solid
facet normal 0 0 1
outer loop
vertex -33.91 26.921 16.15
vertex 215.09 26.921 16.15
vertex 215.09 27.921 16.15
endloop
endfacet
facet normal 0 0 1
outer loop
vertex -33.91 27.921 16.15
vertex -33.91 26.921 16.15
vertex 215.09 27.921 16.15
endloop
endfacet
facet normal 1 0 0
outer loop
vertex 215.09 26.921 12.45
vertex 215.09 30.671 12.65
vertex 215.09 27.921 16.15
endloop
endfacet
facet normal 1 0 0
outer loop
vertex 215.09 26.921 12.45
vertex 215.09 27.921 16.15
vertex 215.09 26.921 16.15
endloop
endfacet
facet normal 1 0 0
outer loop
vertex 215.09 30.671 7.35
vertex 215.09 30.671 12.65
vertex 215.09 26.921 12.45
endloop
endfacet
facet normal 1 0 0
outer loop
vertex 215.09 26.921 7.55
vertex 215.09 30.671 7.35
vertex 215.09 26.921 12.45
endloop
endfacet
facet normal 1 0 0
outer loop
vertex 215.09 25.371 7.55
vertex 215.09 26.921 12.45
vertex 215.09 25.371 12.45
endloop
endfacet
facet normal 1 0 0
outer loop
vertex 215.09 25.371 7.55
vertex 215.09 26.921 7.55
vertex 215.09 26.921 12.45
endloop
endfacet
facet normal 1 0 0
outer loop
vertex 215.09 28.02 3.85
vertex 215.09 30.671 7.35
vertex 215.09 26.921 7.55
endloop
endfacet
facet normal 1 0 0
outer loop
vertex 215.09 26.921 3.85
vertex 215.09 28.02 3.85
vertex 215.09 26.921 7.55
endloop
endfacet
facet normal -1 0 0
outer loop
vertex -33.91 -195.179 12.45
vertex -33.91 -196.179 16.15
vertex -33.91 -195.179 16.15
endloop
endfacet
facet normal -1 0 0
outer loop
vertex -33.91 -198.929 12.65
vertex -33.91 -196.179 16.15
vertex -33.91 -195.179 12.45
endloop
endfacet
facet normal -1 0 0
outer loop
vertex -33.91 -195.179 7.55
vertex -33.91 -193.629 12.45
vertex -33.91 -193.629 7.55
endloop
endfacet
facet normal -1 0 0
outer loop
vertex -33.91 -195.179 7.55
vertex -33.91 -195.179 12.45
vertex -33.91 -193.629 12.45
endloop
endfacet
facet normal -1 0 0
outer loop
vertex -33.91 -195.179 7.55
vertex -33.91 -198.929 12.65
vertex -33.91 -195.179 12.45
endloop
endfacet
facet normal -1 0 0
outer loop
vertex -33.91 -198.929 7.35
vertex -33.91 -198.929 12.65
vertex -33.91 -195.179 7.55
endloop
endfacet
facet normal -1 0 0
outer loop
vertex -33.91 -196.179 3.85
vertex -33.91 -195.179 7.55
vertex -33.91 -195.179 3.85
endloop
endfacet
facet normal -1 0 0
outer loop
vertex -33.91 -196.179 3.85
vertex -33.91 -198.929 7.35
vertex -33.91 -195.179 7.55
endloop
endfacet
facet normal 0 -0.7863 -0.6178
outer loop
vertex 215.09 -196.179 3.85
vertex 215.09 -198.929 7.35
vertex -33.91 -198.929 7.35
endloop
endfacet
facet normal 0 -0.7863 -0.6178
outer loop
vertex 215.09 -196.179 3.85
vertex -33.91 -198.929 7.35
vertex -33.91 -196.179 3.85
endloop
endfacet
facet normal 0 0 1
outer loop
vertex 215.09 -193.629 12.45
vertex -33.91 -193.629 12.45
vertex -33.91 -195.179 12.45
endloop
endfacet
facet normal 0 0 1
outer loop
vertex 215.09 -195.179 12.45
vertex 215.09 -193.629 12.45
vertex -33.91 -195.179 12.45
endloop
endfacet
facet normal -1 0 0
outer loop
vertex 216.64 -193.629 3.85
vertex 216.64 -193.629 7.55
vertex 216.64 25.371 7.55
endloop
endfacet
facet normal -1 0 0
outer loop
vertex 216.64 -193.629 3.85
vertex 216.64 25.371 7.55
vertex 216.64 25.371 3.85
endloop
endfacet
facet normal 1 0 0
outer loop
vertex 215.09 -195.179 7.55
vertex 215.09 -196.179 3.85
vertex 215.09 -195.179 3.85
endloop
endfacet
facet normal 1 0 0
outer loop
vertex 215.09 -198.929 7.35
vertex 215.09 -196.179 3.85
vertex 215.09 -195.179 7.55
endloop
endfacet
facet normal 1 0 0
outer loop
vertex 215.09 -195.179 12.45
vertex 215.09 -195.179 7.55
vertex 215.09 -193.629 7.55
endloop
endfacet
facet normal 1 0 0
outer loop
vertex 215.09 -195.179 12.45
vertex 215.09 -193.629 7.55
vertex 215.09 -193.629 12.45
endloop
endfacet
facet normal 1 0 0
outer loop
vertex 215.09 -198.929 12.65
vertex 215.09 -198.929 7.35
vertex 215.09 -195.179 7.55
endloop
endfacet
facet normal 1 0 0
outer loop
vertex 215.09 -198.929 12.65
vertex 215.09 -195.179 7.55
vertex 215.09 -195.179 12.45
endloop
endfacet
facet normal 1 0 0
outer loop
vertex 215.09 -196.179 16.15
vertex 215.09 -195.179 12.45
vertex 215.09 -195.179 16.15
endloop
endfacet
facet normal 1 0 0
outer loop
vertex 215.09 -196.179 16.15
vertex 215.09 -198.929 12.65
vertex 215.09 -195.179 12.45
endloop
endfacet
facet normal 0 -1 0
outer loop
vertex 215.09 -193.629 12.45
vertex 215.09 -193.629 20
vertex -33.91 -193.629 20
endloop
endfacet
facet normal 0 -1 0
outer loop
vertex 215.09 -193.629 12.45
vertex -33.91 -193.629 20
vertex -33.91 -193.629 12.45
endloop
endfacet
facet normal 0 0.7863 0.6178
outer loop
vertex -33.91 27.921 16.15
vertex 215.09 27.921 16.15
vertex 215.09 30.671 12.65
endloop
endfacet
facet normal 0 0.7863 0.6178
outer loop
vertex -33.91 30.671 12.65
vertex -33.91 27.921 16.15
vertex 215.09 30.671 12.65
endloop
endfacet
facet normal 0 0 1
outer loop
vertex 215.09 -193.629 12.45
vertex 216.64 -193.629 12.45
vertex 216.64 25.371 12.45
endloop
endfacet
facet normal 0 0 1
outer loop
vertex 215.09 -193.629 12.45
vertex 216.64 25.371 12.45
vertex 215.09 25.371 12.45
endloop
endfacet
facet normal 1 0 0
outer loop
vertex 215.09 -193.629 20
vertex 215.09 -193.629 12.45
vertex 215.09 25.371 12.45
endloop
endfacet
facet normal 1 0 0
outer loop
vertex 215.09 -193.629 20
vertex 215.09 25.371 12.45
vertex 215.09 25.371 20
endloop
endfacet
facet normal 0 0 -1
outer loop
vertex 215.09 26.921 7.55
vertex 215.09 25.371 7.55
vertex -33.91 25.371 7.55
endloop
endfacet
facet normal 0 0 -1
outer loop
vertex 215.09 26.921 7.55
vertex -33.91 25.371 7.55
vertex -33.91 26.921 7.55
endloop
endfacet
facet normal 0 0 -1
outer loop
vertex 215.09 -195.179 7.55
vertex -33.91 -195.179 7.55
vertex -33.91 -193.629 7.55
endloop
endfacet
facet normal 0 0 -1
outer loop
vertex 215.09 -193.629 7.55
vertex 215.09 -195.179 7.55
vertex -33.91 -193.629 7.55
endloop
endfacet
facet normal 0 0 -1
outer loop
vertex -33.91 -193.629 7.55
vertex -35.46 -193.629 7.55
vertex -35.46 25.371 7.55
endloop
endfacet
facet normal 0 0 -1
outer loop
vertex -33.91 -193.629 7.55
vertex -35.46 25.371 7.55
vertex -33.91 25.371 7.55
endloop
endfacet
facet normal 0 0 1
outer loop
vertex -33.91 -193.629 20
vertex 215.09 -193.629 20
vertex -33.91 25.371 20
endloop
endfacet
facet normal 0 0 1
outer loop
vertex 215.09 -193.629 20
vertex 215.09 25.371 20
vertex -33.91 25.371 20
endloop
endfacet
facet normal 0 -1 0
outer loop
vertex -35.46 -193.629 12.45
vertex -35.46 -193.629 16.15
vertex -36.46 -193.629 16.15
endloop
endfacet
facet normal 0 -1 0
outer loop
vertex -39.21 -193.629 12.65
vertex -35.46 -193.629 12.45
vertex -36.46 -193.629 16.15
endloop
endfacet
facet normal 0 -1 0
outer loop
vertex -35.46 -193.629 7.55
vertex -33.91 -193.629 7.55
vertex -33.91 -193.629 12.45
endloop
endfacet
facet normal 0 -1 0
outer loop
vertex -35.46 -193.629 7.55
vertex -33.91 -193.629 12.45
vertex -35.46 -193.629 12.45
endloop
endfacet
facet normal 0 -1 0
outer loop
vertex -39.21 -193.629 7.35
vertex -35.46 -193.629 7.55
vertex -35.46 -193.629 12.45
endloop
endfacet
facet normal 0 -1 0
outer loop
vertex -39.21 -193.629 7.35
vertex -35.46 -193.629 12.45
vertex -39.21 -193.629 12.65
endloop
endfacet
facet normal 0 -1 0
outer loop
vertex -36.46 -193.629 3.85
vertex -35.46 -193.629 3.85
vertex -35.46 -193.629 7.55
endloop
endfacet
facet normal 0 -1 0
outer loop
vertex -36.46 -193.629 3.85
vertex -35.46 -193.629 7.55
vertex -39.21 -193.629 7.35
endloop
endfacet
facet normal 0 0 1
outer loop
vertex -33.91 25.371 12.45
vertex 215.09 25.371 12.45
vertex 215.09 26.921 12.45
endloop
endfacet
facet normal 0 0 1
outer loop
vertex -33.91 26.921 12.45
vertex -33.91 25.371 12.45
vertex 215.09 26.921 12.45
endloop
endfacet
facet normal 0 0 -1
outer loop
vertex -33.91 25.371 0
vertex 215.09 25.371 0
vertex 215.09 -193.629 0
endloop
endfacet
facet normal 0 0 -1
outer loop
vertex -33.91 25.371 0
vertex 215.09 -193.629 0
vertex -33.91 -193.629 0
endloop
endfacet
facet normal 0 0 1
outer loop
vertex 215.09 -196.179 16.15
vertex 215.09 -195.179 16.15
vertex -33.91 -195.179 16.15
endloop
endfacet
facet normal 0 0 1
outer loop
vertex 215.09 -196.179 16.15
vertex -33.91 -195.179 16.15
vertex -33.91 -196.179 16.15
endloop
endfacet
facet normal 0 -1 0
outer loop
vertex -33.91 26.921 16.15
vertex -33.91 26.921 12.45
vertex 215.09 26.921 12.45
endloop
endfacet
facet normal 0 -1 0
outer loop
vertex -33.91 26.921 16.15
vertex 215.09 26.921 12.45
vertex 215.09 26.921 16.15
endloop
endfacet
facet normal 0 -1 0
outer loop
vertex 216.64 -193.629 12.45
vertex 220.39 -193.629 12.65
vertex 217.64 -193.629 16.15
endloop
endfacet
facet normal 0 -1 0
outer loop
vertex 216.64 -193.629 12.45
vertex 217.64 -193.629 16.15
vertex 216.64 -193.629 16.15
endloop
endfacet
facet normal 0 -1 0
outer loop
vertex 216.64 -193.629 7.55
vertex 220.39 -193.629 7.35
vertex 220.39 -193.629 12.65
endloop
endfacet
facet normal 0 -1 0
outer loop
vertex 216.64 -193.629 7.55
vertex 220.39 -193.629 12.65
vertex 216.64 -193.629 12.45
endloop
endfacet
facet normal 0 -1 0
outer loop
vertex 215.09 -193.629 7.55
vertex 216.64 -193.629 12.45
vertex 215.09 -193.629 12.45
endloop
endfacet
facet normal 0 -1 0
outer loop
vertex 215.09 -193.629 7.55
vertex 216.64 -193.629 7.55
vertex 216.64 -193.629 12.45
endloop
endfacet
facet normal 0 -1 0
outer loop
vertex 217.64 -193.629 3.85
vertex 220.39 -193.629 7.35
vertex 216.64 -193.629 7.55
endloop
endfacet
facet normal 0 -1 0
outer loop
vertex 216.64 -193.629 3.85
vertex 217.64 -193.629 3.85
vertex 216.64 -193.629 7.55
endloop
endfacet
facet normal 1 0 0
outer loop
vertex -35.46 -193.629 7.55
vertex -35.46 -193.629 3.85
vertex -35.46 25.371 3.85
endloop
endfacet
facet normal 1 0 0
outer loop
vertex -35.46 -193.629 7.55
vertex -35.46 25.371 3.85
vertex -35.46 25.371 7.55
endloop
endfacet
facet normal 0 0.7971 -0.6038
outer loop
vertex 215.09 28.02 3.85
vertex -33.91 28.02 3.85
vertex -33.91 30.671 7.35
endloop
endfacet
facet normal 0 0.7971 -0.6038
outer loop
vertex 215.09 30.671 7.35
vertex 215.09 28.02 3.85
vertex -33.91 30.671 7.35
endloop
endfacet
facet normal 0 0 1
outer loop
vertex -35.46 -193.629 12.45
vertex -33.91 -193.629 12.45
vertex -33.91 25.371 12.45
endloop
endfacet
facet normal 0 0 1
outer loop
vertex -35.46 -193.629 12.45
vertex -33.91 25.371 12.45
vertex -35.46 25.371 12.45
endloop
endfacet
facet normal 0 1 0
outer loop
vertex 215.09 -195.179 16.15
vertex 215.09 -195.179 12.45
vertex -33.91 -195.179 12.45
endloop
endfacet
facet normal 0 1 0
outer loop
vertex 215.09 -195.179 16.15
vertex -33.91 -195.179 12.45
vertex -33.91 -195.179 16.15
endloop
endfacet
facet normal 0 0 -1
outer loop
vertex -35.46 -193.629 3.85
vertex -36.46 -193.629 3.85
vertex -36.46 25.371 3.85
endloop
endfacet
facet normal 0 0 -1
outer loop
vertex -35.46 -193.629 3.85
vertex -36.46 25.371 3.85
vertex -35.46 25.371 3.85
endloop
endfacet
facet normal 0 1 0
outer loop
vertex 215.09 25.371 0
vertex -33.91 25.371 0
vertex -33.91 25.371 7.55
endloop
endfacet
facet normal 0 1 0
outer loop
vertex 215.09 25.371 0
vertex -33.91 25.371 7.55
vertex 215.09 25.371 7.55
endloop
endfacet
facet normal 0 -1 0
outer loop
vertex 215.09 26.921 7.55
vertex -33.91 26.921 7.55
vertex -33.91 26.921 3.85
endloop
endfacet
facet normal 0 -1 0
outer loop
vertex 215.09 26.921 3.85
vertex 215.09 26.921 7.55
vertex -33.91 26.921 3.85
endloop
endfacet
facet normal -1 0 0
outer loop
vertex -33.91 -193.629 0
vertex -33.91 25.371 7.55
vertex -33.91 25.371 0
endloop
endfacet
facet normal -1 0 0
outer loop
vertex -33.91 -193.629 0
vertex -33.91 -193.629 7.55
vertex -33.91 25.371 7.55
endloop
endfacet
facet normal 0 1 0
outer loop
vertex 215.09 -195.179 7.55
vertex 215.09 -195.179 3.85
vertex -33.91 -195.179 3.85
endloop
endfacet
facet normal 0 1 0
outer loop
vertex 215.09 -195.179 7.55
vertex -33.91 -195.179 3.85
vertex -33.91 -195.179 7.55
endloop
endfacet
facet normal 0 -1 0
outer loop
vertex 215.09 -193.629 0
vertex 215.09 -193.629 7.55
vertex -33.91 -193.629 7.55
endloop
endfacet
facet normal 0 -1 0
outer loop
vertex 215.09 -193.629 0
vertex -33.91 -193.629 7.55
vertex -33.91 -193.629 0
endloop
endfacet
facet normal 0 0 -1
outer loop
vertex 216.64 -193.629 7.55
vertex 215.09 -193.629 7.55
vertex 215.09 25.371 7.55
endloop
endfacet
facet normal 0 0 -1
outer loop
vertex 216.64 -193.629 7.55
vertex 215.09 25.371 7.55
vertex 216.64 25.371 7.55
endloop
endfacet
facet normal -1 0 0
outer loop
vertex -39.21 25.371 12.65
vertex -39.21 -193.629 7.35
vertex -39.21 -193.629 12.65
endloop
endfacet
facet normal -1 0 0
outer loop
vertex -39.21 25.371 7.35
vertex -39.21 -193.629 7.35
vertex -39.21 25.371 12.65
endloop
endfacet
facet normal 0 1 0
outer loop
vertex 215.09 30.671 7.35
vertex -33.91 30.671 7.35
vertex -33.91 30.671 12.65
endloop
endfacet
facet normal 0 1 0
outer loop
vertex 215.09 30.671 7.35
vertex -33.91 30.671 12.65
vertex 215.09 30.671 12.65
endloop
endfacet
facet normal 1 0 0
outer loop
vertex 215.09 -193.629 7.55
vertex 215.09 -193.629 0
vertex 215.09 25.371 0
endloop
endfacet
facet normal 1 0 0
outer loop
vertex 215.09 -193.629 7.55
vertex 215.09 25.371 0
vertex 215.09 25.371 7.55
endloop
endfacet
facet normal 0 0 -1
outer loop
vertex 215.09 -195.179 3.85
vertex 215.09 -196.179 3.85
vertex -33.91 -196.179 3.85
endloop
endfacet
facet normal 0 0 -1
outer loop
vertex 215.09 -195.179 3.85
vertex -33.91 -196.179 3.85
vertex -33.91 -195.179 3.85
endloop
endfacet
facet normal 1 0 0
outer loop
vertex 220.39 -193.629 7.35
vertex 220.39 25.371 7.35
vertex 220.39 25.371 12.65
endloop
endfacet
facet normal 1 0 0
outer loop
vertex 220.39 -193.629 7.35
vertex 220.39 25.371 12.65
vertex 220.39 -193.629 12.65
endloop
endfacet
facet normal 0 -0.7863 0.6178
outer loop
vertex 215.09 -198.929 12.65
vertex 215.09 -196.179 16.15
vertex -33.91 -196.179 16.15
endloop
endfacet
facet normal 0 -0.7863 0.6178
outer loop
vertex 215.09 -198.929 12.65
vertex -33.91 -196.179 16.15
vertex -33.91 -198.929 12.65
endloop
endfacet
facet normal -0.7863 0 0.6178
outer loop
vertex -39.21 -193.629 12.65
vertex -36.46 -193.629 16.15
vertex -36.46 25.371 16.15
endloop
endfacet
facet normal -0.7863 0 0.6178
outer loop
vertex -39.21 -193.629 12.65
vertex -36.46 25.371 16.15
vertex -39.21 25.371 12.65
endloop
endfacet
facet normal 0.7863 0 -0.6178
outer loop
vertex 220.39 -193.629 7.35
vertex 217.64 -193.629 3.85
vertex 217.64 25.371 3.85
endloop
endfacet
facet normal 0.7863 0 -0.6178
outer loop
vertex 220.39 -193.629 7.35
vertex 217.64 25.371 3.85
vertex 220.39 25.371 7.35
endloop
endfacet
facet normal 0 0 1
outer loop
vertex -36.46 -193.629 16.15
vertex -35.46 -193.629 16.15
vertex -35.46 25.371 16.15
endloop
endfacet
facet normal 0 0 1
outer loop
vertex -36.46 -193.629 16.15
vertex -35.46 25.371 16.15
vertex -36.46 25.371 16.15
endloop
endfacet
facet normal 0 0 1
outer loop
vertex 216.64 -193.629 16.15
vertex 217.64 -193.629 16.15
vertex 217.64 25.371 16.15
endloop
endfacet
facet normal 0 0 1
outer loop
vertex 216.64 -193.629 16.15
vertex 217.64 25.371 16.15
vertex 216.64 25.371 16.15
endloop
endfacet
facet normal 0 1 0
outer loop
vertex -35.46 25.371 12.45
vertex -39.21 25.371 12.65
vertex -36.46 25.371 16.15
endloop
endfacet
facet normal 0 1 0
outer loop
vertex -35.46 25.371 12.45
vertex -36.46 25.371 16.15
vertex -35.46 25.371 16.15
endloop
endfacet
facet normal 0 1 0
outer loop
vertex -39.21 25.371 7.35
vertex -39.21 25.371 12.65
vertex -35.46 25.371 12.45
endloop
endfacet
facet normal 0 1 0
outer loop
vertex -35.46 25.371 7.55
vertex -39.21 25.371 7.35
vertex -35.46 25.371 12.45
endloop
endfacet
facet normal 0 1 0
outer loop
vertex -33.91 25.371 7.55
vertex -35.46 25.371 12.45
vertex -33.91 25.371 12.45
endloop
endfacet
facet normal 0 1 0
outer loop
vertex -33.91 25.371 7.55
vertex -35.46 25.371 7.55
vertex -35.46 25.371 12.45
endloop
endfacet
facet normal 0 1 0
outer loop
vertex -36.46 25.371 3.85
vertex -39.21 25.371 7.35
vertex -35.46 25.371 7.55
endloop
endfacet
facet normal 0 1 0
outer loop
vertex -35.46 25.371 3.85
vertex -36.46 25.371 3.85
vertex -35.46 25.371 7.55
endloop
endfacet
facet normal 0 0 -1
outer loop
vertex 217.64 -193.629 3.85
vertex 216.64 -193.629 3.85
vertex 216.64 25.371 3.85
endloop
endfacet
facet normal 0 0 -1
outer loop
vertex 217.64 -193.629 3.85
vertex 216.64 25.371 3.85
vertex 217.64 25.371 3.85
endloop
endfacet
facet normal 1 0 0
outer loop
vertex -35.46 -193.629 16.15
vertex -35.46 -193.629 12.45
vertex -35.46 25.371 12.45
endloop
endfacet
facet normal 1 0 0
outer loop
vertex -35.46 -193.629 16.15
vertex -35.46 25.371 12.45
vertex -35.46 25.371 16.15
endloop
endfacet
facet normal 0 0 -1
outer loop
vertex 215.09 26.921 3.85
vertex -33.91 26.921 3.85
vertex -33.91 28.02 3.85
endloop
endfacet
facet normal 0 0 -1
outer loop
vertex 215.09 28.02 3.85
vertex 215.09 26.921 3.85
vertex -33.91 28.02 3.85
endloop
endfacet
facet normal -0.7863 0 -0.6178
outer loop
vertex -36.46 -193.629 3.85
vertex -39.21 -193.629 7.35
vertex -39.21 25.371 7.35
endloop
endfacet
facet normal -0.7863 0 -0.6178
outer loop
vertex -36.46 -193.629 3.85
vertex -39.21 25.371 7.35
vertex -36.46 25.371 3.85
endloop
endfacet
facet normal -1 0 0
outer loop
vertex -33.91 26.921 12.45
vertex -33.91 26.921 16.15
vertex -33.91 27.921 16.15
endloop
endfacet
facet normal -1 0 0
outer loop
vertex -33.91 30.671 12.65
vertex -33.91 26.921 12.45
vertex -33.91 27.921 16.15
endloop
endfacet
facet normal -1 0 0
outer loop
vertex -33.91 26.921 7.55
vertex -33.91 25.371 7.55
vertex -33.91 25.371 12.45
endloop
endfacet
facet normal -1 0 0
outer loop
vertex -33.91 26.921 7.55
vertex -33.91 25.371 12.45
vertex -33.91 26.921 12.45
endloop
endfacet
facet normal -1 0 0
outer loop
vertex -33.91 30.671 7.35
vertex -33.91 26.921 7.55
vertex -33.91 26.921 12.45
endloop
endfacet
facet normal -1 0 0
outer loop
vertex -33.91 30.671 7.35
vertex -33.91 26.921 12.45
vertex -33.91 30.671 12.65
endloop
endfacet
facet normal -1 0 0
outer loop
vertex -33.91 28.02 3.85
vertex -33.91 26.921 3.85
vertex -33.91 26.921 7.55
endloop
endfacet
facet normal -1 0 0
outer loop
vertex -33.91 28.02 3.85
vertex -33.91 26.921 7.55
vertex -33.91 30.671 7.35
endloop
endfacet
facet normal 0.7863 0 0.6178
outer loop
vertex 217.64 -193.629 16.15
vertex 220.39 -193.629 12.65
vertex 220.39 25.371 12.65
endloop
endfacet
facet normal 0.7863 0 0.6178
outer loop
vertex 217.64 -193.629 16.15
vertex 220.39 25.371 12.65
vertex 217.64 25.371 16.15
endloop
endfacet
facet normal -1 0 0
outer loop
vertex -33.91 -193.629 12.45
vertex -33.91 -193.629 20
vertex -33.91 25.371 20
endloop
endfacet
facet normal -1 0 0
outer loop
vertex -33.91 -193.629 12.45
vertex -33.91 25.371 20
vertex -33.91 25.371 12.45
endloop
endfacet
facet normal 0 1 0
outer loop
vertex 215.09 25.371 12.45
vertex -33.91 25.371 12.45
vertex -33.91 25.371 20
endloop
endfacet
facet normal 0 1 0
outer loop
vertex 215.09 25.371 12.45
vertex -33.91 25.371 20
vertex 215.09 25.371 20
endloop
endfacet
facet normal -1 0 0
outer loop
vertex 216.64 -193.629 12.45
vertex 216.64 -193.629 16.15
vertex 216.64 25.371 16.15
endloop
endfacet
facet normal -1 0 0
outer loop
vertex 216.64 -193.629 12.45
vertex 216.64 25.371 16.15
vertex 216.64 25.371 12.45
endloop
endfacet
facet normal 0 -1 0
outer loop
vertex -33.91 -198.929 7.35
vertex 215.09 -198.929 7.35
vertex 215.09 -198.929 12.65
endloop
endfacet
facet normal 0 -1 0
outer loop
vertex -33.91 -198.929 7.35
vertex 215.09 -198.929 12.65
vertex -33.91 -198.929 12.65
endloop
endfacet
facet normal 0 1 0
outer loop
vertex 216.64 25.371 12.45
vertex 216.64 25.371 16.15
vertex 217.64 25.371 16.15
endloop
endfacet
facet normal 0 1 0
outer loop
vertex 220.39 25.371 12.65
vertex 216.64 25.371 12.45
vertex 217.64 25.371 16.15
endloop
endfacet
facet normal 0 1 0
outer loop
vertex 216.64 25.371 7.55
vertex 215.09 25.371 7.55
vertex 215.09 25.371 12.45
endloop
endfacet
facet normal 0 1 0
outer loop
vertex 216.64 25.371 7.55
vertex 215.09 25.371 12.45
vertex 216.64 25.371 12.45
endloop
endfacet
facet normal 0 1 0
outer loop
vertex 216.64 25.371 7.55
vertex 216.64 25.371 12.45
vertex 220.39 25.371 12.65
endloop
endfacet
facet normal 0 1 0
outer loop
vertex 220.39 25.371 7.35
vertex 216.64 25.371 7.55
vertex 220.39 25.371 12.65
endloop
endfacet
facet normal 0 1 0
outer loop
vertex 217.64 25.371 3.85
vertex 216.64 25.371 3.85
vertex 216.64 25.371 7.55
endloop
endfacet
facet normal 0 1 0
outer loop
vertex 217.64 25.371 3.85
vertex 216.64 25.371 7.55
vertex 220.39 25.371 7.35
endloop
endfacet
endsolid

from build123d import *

# Parameters (mm, degrees)
BOSS_EXTRU_1_DEPTH            = 20
ENL_V_MAT_EXTRU_2_DEPTH       = 324.482768921
ENL_V_MAT_EXTRU_2_DEPTH_BACK  = 249
ENL_V_MAT_EXTRU_3_DEPTH       = 324.482768921
ENL_V_MAT_EXTRU_3_DEPTH_BACK  = 249
ENL_V_MAT_EXTRU_4_DEPTH       = 316.090774845
ENL_V_MAT_EXTRU_4_DEPTH_BACK  = 219
ENL_V_MAT_EXTRU_5_DEPTH       = 316.090774845
ENL_V_MAT_EXTRU_5_DEPTH_BACK  = 219
ENL_V_MAT_EXTRU_7_DEPTH       = 316.090774845
ENL_V_MAT_EXTRU_7_DEPTH_BACK  = 219
ENL_V_MAT_EXTRU_8_DEPTH       = 316.090774845
ENL_V_MAT_EXTRU_8_DEPTH_BACK  = 219
ENL_V_MAT_EXTRU_9_DEPTH       = 324.482768921
ENL_V_MAT_EXTRU_9_DEPTH_BACK  = 249
ENL_V_MAT_EXTRU_10_DEPTH      = 324.482768921
ENL_V_MAT_EXTRU_10_DEPTH_BACK = 249


with BuildPart() as part:
    # Esquisse1 → Boss.-Extru.1 (new body)
    with BuildSketch(Plane.XY):
        Polygon((-33.910103697, 30.671339951), (215.089896303, 30.671339951), (215.089896303, 25.371339951), (220.389896303, 25.371339951), (220.389896303, -193.628660049), (215.089896303, -193.628660049), (215.089896303, -198.928660049), (-33.910103697, -198.928660049), (-33.910103697, -193.628660049), (-39.210103697, -193.628660049), (-39.210103697, 25.371339951), (-33.910103697, 25.371339951), align=None)
    extrude(amount=BOSS_EXTRU_1_DEPTH)

    # Esquisse2 → Enlèv. mat.-Extru.2 (cut, two sides: drawn at the far end of the back side and taken through both)
    with BuildSketch(Plane(origin=(215.089896303, 0, 0), x_dir=(0, 0, -1), z_dir=(1, 0, 0)).offset(-ENL_V_MAT_EXTRU_2_DEPTH_BACK)):
        Polygon((-489.896433994, 25.371339951), (-20, 25.371339951), (-12.45, 25.371339951), (-12.45, 26.921339951), (-16.15, 26.921339951), (-16.15, 27.921339951), (-12.65, 30.671339951), (356.838183396, 320.983484048), (47.072753092, 1208.257969711), (-799.661864298, 912.645825614), align=None)
    extrude(amount=ENL_V_MAT_EXTRU_2_DEPTH + ENL_V_MAT_EXTRU_2_DEPTH_BACK, mode=Mode.SUBTRACT)

    # Esquisse3 → Enlèv. mat.-Extru.3 (cut, two sides: drawn at the far end of the back side and taken through both)
    with BuildSketch(Plane(origin=(215.089896303, 0, 0), x_dir=(0, 0, -1), z_dir=(1, 0, 0)).offset(-ENL_V_MAT_EXTRU_3_DEPTH_BACK)):
        Polygon((469.896433994, 25.371339951), (0, 25.371339951), (-7.55, 25.371339951), (-7.55, 26.921339951), (-3.85, 26.921339951), (-3.85, 28.020478953), (-7.35, 30.671339951), (-381.934453377, 314.377430771), (-79.989898168, 1204.343789854), (771.840989202, 915.337699034), align=None)
    extrude(amount=ENL_V_MAT_EXTRU_3_DEPTH + ENL_V_MAT_EXTRU_3_DEPTH_BACK, mode=Mode.SUBTRACT)

    # Esquisse5 → Enlèv. mat.-Extru.4 (cut, two sides: drawn at the far end of the back side and taken through both)
    with BuildSketch(Plane(origin=(0, 25.371339951, 0), x_dir=(1, 0, 0), z_dir=(0, 1, 0)).offset(-ENL_V_MAT_EXTRU_4_DEPTH_BACK)):
        Polygon((215.089896303, 0), (215.089896303, -7.55), (216.639896303, -7.55), (216.639896303, -3.85), (217.639896303, -3.85), (220.389896303, -7.35), (220.389896303, 0), align=None)
    extrude(amount=ENL_V_MAT_EXTRU_4_DEPTH + ENL_V_MAT_EXTRU_4_DEPTH_BACK, mode=Mode.SUBTRACT)

    # Esquisse7 → Enlèv. mat.-Extru.5 (cut, two sides: drawn at the far end of the back side and taken through both)
    with BuildSketch(Plane(origin=(0, 25.371339951, 0), x_dir=(1, 0, 0), z_dir=(0, 1, 0)).offset(-ENL_V_MAT_EXTRU_5_DEPTH_BACK)):
        Polygon((547.721673026, 403.954079466), (220.389896303, -12.65), (217.639896303, -16.15), (216.639896303, -16.15), (216.639896303, -12.45), (215.089896303, -12.45), (215.089896303, -20), (215.089896303, -549.816054004), (1215.620408753, -898.755730707), (1548.252185476, 55.014402763), align=None)
    extrude(amount=ENL_V_MAT_EXTRU_5_DEPTH + ENL_V_MAT_EXTRU_5_DEPTH_BACK, mode=Mode.SUBTRACT)

    # Esquisse9 → Enlèv. mat.-Extru.7 (cut, two sides: drawn at the far end of the back side and taken through both)
    with BuildSketch(Plane(origin=(0, 25.371339951, 0), x_dir=(1, 0, 0), z_dir=(0, 1, 0)).offset(-ENL_V_MAT_EXTRU_7_DEPTH_BACK)):
        Polygon((-33.910103697, -20), (-33.910103697, -12.45), (-35.460103697, -12.45), (-35.460103697, -16.15), (-36.460103697, -16.15), (-39.210103697, -12.65), (-39.210103697, -20), align=None)
    extrude(amount=ENL_V_MAT_EXTRU_7_DEPTH + ENL_V_MAT_EXTRU_7_DEPTH_BACK, mode=Mode.SUBTRACT)

    # Esquisse10 → Enlèv. mat.-Extru.8 (cut, two sides: drawn at the far end of the back side and taken through both)
    with BuildSketch(Plane(origin=(0, 25.371339951, 0), x_dir=(1, 0, 0), z_dir=(0, 1, 0)).offset(-ENL_V_MAT_EXTRU_8_DEPTH_BACK)):
        Polygon((-366.54188042, -423.954079466), (-39.210103697, -7.35), (-36.460103697, -3.85), (-35.460103697, -3.85), (-35.460103697, -7.55), (-33.910103697, -7.55), (-33.910103697, 0), (-33.910103697, 529.816054004), (-1034.440616146, 878.755730707), (-1367.072392869, -75.014402763), align=None)
    extrude(amount=ENL_V_MAT_EXTRU_8_DEPTH + ENL_V_MAT_EXTRU_8_DEPTH_BACK, mode=Mode.SUBTRACT)

    # Esquisse12 → Enlèv. mat.-Extru.9 (cut, two sides: drawn at the far end of the back side and taken through both)
    with BuildSketch(Plane.ZY.offset(33.910103697).offset(-ENL_V_MAT_EXTRU_9_DEPTH_BACK)):
        Polygon((20, -193.628660049), (12.45, -193.628660049), (12.45, -195.178660049), (16.15, -195.178660049), (16.15, -196.178660049), (12.65, -198.928660049), (20, -198.928660049), align=None)
    extrude(amount=ENL_V_MAT_EXTRU_9_DEPTH + ENL_V_MAT_EXTRU_9_DEPTH_BACK, mode=Mode.SUBTRACT)

    # Esquisse13 → Enlèv. mat.-Extru.10 (cut, two sides: drawn at the far end of the back side and taken through both)
    with BuildSketch(Plane.ZY.offset(33.910103697).offset(-ENL_V_MAT_EXTRU_10_DEPTH_BACK)):
        Polygon((376.838183396, -489.240804146), (7.35, -198.928660049), (3.85, -196.178660049), (3.85, -195.178660049), (7.55, -195.178660049), (7.55, -193.628660049), (0, -193.628660049), (-469.896433994, -193.628660049), (-779.661864298, -1080.903145712), (67.072753092, -1376.515289809), align=None)
    extrude(amount=ENL_V_MAT_EXTRU_10_DEPTH + ENL_V_MAT_EXTRU_10_DEPTH_BACK, mode=Mode.SUBTRACT)


solid = part.part
